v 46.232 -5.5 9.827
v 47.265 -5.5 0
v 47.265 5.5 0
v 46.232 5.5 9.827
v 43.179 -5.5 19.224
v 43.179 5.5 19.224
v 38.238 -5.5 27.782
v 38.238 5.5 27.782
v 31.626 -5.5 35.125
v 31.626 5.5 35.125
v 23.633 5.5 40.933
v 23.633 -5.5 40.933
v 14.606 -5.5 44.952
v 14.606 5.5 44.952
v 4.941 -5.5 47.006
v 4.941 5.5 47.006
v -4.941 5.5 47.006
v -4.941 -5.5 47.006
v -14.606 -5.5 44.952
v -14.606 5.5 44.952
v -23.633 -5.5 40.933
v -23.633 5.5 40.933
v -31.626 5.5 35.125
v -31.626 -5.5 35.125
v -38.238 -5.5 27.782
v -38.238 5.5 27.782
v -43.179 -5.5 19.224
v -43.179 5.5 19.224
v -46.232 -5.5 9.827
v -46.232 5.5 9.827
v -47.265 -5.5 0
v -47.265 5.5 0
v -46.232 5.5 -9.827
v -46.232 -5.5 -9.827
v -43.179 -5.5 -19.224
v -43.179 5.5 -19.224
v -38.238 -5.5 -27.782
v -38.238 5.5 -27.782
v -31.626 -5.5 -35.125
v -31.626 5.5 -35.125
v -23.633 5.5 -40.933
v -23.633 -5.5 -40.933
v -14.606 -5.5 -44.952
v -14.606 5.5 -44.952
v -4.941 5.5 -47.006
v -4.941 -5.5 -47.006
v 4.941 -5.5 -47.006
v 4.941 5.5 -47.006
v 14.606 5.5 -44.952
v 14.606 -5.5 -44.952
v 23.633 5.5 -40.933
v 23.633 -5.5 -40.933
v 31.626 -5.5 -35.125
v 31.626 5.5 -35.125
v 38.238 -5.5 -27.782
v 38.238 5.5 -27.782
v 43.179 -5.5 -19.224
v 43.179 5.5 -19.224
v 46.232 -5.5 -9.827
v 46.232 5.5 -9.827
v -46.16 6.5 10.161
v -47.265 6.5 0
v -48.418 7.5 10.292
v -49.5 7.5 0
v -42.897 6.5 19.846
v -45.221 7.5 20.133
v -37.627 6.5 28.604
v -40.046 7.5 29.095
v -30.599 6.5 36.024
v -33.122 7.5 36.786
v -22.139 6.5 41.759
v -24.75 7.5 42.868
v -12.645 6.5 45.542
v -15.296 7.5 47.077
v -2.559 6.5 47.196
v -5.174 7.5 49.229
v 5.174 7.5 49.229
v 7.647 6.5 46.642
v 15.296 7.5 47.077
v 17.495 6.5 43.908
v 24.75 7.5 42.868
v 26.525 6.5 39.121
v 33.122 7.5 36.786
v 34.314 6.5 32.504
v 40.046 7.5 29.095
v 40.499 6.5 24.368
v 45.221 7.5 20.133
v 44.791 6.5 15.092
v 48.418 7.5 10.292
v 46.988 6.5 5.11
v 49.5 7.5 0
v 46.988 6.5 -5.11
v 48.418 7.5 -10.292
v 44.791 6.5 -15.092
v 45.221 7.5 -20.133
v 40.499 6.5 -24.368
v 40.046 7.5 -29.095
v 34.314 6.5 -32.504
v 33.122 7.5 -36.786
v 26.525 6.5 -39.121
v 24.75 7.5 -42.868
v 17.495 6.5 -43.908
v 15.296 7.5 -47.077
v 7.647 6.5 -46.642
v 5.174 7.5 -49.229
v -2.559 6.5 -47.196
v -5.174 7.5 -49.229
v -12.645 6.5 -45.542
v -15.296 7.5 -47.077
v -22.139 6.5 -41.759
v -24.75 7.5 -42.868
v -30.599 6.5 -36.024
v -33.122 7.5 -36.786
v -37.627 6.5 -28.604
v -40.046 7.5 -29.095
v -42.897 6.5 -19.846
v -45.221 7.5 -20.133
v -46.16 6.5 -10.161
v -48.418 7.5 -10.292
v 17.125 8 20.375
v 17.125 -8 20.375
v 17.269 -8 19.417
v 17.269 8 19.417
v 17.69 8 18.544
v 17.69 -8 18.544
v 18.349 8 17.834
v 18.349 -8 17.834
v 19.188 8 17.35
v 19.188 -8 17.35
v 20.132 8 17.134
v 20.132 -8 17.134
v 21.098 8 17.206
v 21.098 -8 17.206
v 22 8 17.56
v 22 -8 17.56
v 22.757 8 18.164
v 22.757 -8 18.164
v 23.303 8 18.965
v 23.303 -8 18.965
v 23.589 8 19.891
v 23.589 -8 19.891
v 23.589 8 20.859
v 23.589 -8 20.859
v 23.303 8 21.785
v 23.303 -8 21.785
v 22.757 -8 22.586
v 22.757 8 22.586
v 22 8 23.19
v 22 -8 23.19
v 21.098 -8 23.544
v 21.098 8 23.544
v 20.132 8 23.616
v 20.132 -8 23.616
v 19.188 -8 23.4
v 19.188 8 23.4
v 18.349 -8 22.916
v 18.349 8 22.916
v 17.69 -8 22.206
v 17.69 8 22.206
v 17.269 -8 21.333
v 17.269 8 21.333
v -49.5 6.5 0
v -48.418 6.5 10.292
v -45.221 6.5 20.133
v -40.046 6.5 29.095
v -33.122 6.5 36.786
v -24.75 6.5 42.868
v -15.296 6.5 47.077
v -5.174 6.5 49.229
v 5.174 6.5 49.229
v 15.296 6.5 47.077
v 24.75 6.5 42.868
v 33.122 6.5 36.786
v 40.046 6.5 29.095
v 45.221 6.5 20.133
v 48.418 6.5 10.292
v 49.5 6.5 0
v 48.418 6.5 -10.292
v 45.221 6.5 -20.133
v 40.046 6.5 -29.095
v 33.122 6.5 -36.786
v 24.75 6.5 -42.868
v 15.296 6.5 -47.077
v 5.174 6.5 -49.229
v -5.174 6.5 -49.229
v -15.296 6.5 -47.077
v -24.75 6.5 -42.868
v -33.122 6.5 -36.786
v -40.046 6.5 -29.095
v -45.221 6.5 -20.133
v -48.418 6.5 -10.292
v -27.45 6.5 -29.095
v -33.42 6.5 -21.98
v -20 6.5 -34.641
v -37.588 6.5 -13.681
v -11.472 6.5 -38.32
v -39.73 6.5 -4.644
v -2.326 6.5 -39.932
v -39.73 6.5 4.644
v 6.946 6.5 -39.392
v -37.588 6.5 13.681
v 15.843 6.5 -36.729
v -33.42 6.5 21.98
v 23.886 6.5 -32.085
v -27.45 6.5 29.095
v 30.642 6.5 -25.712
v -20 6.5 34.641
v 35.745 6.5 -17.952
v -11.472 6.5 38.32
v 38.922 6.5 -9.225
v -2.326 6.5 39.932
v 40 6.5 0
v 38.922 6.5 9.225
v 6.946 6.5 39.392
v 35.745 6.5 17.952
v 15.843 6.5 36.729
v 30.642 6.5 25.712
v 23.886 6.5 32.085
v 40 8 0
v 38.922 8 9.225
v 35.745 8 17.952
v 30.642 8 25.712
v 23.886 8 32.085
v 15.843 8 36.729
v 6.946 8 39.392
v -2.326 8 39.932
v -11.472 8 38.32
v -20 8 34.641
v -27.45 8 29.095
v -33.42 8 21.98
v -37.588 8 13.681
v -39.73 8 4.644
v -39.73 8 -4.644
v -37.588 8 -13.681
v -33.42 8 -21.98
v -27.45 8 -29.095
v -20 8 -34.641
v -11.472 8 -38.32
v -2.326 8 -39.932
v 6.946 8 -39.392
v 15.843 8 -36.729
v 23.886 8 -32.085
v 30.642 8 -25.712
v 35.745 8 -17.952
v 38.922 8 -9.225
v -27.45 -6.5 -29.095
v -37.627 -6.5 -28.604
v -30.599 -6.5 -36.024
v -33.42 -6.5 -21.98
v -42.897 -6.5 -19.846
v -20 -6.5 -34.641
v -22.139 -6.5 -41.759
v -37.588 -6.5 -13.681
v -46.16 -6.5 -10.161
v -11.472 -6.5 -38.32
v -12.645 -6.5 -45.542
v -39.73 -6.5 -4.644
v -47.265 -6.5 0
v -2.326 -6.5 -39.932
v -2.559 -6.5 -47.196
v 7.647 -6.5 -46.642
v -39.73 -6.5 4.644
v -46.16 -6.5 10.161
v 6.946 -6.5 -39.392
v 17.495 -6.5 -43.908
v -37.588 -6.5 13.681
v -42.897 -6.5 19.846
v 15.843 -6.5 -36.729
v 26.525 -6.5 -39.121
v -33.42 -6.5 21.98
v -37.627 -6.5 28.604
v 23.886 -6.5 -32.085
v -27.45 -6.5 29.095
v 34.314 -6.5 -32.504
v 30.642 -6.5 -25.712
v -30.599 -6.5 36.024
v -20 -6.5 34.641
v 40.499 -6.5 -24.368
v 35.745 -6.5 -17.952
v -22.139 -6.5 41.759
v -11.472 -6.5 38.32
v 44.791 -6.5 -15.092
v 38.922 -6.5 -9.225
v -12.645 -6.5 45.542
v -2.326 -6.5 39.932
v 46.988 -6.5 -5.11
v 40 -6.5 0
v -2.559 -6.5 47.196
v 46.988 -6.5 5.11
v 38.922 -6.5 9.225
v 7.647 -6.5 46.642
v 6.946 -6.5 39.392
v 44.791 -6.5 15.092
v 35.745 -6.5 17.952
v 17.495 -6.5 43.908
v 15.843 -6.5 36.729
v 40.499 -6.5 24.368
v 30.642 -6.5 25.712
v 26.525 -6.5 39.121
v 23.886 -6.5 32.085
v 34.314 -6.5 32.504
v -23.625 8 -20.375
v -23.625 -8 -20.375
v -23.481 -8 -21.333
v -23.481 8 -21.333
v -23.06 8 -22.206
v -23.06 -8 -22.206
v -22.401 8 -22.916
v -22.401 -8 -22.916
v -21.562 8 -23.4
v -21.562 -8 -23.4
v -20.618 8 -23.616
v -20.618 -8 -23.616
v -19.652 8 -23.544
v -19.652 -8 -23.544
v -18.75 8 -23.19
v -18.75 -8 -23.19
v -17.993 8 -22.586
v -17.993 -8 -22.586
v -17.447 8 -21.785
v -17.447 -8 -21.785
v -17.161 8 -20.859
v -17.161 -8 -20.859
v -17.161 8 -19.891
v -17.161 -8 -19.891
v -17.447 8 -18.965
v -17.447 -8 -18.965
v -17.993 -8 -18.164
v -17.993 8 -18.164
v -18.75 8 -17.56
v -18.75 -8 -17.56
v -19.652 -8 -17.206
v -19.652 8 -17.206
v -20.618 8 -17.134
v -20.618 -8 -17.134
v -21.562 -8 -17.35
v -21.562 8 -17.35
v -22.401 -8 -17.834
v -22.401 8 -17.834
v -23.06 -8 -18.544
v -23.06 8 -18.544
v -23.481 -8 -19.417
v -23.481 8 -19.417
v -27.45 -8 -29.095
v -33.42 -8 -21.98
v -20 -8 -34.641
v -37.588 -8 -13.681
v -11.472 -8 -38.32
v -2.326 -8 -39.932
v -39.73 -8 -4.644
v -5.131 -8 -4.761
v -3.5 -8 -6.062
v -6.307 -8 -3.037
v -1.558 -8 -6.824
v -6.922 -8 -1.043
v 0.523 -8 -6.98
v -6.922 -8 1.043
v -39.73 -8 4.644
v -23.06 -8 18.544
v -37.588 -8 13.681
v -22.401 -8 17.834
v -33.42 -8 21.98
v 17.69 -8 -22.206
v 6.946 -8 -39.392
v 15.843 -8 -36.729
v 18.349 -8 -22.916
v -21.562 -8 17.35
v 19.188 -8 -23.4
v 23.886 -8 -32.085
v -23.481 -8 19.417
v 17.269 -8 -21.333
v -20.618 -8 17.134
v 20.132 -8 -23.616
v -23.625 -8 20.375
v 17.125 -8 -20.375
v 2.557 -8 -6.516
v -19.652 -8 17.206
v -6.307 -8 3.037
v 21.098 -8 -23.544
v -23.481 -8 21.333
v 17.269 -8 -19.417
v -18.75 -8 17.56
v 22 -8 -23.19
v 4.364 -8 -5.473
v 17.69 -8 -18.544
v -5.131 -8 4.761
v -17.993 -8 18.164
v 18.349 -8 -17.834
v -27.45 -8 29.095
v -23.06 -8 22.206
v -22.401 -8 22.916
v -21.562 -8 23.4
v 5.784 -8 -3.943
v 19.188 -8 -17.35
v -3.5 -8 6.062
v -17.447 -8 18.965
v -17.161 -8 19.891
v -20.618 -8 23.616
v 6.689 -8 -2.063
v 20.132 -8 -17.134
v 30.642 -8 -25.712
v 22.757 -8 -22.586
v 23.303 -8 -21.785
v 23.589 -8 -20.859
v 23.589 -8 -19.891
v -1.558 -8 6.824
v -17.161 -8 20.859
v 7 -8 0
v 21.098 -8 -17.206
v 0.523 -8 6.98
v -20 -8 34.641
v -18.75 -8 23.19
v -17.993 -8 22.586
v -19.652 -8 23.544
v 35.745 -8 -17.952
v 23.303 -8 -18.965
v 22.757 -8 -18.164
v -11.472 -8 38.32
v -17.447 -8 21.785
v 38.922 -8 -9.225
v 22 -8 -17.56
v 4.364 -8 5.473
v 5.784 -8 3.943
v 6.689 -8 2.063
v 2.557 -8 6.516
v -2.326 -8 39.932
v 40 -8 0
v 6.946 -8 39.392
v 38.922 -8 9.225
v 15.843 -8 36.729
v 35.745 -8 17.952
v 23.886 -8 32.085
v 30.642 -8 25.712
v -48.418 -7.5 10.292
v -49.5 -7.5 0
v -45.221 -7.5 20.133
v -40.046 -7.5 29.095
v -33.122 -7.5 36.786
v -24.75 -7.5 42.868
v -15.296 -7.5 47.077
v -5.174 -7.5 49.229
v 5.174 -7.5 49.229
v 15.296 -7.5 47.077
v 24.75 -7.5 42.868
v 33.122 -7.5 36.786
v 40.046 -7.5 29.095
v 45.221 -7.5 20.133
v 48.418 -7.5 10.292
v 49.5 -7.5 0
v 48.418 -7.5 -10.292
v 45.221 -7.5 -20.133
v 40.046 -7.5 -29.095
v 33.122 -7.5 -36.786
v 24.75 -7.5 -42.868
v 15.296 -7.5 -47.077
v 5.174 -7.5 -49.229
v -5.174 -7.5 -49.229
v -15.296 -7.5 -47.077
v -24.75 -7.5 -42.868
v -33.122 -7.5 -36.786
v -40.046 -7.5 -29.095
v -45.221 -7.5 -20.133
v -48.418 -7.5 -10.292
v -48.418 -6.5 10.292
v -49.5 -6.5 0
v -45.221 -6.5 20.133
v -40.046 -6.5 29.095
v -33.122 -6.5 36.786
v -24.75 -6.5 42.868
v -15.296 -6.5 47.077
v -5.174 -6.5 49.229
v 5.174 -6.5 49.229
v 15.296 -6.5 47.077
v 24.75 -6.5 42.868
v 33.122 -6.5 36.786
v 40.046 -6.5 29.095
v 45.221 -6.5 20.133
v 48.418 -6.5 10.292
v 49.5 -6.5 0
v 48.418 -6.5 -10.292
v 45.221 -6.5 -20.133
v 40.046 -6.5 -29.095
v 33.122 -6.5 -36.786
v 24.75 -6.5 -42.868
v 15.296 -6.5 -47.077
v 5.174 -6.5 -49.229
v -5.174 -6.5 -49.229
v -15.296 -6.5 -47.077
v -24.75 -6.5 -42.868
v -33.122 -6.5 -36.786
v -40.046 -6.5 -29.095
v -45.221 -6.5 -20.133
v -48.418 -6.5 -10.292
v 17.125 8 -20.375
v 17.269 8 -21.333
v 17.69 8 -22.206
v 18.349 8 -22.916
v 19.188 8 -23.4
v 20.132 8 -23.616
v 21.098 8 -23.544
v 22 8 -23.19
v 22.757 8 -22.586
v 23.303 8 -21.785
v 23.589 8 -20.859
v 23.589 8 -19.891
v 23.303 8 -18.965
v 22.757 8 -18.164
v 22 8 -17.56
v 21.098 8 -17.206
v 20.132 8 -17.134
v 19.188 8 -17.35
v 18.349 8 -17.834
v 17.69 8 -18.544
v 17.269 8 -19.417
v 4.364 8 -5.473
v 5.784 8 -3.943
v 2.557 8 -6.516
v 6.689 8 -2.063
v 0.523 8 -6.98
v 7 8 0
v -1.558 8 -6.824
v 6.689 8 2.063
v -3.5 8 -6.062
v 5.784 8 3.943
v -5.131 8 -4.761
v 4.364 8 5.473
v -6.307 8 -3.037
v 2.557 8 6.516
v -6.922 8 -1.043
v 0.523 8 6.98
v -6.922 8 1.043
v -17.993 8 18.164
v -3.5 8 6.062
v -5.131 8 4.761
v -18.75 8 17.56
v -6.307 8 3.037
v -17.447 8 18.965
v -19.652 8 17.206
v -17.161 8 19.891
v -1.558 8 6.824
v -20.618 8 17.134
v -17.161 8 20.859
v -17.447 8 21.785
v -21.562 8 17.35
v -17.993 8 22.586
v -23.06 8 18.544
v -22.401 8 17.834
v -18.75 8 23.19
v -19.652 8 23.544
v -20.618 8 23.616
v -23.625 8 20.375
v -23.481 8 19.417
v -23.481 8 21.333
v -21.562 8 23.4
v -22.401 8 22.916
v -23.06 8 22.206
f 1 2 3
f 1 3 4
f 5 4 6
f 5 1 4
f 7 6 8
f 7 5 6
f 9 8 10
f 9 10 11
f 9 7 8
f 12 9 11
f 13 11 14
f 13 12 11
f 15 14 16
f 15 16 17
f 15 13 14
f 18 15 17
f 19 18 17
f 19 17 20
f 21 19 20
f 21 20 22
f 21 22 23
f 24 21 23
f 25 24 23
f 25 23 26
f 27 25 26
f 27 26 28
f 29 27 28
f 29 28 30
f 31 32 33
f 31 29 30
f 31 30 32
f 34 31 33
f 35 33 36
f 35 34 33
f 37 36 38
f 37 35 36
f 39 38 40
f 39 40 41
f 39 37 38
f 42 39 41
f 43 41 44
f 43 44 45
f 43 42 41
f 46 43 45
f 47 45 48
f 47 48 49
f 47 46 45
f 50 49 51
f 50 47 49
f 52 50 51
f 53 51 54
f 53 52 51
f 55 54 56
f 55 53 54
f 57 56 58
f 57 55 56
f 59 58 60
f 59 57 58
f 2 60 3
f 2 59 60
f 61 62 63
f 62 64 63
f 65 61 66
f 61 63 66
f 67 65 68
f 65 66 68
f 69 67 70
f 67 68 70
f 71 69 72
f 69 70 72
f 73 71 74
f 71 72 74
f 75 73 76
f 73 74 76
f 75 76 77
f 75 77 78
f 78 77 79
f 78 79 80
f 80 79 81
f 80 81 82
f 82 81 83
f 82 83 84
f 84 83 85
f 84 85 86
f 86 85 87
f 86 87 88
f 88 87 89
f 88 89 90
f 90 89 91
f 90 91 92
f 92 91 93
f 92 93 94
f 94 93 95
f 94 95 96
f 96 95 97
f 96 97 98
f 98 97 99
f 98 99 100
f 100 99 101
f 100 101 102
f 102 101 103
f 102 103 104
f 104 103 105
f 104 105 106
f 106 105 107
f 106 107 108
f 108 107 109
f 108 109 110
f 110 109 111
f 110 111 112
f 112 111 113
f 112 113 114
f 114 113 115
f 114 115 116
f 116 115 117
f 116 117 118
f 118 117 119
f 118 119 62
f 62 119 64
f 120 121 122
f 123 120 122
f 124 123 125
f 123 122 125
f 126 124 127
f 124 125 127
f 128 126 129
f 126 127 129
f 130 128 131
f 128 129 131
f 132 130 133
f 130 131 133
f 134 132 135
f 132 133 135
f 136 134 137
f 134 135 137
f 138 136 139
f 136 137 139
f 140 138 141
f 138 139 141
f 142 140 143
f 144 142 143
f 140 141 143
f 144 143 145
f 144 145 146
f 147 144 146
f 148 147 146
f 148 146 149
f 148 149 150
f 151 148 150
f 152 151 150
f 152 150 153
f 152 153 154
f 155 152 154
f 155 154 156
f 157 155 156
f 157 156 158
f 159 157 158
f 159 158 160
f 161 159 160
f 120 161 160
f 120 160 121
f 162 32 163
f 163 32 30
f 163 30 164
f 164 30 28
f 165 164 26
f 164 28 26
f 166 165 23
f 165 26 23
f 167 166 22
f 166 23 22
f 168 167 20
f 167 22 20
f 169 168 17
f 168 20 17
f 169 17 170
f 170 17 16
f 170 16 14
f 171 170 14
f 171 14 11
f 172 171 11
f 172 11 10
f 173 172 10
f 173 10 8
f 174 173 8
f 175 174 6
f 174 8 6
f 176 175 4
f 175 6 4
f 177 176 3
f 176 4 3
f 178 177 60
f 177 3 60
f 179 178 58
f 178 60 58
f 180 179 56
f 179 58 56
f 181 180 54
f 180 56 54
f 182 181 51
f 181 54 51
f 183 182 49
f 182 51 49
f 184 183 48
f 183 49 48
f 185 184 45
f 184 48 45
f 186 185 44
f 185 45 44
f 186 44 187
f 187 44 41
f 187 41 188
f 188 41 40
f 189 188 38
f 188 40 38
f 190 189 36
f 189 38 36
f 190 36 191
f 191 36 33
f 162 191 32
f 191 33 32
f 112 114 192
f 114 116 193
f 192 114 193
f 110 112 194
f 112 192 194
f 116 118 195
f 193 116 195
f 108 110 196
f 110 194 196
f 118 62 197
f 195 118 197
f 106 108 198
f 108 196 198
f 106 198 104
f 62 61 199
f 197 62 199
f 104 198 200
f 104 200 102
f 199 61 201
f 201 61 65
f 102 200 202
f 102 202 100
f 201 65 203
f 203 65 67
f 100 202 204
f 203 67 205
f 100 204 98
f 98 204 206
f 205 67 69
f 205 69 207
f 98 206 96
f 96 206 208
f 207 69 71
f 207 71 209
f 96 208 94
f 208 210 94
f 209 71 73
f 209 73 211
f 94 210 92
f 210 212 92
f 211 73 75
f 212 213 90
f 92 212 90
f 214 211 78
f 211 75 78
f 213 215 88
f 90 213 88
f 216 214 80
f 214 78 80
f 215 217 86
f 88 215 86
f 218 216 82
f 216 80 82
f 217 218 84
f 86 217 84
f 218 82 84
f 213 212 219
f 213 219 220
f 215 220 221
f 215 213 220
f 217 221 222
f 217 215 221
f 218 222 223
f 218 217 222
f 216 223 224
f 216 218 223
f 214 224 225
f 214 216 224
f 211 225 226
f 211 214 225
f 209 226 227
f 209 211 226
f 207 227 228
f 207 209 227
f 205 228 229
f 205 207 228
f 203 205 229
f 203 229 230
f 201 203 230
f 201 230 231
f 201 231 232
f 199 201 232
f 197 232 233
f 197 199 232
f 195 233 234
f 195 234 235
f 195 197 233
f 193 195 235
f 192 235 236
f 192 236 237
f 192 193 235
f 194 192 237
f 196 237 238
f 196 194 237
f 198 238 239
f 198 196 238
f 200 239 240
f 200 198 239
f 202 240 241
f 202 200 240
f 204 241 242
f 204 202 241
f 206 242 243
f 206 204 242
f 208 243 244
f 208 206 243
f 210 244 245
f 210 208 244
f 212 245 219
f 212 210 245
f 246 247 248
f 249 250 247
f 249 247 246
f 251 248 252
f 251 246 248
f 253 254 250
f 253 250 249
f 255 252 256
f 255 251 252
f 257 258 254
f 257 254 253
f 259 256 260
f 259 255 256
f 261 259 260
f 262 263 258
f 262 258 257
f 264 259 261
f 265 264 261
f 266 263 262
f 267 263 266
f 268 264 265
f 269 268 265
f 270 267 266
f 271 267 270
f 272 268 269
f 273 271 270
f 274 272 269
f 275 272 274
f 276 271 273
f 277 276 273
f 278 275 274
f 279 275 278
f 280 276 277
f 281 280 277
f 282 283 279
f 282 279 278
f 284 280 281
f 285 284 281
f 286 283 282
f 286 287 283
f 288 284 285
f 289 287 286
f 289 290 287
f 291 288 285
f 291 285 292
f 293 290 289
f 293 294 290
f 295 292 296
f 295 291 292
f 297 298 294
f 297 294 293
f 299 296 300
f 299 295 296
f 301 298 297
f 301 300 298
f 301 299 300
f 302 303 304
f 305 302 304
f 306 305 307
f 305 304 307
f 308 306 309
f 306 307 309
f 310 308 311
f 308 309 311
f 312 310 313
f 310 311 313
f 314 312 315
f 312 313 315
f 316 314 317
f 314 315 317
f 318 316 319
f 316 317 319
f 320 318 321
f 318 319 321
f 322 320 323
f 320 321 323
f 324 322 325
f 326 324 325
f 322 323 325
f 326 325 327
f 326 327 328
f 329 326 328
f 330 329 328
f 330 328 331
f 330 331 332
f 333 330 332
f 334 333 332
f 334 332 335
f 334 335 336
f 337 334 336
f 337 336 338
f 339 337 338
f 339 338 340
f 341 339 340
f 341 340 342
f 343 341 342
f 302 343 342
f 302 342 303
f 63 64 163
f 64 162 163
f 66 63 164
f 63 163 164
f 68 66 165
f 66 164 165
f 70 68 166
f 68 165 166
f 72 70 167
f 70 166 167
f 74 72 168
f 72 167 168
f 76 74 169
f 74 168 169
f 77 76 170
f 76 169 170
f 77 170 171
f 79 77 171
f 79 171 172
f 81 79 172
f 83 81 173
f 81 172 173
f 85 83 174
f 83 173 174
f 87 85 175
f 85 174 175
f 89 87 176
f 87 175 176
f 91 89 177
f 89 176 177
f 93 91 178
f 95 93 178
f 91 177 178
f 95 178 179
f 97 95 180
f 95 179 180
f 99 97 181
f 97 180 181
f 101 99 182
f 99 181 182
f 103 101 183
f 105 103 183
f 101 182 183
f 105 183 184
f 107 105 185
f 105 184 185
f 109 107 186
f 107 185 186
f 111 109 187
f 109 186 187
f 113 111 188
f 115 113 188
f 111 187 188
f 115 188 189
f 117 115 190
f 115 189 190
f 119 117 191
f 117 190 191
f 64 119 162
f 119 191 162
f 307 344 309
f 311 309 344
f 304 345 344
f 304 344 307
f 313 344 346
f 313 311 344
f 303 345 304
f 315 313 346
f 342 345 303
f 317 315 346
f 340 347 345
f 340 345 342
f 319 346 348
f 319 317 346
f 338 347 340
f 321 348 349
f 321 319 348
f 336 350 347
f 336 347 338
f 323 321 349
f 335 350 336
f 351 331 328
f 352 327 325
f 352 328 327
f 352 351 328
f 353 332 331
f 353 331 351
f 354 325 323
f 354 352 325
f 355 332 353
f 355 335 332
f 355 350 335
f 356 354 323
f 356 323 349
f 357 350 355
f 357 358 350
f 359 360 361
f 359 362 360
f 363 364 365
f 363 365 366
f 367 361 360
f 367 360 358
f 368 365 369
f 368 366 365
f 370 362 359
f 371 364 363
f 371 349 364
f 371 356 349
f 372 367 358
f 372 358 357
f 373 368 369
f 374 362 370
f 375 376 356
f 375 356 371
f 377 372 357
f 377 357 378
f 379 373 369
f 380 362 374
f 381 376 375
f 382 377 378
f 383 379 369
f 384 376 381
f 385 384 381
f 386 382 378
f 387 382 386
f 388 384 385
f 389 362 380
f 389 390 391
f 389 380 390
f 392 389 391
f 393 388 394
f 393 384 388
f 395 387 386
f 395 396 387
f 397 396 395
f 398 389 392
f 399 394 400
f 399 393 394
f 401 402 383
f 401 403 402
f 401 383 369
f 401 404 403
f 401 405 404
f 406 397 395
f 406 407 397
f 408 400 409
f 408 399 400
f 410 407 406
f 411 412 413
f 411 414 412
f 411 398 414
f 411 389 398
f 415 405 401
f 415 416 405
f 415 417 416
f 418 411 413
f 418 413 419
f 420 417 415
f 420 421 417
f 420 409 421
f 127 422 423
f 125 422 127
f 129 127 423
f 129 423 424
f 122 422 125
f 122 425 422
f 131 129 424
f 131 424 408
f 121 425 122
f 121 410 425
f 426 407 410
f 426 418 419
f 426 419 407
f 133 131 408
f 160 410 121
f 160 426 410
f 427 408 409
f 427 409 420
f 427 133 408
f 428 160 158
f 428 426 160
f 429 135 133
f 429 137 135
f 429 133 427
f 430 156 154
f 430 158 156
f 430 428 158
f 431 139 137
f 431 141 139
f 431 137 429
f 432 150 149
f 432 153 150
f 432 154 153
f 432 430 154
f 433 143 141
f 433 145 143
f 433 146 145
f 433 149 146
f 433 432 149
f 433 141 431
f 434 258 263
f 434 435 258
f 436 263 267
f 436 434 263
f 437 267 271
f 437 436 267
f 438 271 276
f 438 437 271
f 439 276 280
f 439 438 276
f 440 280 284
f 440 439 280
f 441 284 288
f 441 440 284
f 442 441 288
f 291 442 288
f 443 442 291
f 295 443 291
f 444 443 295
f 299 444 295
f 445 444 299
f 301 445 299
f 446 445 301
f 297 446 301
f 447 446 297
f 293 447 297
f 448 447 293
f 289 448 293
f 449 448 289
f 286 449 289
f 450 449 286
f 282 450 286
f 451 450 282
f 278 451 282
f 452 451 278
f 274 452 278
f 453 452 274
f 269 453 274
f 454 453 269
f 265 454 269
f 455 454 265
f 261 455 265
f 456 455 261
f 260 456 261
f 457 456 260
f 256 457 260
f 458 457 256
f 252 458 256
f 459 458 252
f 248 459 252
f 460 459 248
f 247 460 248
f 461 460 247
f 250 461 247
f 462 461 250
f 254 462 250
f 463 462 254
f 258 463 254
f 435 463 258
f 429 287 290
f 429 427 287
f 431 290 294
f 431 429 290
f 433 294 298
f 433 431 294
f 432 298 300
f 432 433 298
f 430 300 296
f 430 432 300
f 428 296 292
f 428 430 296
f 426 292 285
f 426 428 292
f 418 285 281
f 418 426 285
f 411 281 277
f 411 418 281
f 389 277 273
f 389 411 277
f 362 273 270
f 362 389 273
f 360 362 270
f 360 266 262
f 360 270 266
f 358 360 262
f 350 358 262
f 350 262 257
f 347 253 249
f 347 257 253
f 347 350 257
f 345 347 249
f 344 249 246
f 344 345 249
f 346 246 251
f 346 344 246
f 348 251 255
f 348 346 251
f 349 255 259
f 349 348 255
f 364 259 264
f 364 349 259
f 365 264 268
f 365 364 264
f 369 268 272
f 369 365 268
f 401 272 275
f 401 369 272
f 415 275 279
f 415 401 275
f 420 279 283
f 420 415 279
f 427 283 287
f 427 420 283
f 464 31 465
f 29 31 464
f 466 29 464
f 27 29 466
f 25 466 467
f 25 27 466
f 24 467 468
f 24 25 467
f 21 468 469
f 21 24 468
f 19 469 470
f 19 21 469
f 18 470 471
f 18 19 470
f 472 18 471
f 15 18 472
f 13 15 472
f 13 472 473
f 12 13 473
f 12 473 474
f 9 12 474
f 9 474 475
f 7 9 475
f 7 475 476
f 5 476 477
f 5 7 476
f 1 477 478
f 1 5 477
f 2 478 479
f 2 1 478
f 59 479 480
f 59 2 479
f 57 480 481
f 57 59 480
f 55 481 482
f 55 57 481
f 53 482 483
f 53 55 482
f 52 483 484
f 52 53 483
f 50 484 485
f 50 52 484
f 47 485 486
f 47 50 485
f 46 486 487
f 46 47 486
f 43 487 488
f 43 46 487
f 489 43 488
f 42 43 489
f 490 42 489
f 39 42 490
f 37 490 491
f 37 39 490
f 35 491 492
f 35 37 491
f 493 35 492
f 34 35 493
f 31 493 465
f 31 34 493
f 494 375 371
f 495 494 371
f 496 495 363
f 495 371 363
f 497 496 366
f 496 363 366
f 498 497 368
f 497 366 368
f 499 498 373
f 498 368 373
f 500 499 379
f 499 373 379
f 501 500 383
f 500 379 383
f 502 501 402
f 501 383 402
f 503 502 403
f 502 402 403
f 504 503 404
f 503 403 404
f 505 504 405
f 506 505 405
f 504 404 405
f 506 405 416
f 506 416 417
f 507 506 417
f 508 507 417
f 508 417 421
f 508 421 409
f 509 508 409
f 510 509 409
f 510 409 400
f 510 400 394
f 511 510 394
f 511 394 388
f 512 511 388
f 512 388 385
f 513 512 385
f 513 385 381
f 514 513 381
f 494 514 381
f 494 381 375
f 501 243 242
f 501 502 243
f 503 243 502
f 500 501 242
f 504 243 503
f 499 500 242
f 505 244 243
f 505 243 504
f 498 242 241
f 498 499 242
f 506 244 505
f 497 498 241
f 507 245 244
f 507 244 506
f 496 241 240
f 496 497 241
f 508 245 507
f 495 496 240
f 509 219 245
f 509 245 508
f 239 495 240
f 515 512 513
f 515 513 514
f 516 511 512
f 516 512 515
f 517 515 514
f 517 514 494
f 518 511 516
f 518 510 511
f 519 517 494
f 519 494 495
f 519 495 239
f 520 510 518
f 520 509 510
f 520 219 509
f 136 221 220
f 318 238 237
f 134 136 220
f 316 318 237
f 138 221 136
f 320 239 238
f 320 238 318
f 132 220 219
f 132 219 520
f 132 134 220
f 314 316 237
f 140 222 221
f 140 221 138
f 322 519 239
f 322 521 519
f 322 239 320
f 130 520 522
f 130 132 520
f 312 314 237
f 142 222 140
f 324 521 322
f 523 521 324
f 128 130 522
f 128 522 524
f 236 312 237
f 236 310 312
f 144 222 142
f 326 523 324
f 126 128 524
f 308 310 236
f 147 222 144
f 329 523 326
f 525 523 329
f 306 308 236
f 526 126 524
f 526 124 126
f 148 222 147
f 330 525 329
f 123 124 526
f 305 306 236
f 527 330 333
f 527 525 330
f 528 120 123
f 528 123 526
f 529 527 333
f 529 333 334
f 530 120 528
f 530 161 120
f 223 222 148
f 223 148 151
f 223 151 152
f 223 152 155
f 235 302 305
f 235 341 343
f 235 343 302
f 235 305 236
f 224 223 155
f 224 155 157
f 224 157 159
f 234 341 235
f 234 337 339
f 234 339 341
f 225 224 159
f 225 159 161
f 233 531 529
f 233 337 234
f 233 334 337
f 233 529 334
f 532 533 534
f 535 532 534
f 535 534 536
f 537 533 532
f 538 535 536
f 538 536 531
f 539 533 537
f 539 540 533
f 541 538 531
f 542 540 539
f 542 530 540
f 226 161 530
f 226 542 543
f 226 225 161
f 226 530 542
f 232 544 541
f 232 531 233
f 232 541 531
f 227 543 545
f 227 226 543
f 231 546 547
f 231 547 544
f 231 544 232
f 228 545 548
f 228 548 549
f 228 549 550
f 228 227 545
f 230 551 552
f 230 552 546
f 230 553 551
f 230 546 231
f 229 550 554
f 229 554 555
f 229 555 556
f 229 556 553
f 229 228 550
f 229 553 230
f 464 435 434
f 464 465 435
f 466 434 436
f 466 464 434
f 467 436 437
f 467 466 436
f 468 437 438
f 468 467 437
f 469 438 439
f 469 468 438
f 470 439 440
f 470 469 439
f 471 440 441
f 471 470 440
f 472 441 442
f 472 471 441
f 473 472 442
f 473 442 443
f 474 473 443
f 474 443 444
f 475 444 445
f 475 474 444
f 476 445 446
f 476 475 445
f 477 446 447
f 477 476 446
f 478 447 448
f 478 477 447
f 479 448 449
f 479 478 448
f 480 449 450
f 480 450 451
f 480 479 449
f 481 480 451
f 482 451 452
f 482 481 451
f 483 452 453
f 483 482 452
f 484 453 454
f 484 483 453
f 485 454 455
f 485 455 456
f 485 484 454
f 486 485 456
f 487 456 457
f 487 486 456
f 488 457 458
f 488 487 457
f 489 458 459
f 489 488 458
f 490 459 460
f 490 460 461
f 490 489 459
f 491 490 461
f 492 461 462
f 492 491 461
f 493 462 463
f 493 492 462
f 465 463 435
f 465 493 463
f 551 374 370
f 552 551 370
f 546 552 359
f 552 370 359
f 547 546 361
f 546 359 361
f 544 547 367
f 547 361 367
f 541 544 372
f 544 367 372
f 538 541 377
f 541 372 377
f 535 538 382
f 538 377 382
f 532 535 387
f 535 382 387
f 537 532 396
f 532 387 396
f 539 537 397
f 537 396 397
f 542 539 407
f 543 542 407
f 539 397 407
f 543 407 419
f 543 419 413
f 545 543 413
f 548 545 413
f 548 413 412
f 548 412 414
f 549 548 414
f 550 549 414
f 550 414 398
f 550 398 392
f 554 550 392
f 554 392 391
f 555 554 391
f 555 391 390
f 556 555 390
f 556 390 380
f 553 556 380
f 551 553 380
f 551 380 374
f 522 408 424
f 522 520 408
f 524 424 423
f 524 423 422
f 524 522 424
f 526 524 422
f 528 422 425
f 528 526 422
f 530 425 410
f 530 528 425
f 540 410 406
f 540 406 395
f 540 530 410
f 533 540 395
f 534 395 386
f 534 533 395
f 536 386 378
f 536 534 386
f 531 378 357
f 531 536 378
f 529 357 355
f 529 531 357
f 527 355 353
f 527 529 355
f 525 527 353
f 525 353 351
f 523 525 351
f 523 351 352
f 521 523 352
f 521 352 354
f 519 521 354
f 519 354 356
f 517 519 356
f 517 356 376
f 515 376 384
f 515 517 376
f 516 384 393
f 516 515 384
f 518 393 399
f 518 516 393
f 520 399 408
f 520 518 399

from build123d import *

# Parameters (mm, degrees)
HOLE_WIZARD_6_5_6_5_1_D = 6.5


with BuildPart() as part:
    # 草圖1 → 旋轉1 (revolve)
    with BuildSketch(Plane.XY):
        Polygon((7, -8), (7, 8), (40, 8), (40, 5.5), (47.265, 5.5), (47.265, -5.5), (40, -5.5), (40, -8), align=None)
    revolve(axis=Axis((0, 49.340027701, 0), (0, -1, 0)))

    # 草圖7 → 旋轉2 (revolve)
    with BuildSketch(Plane.XY):
        Polygon((-49.5, -6.5), (-47.265, -5.5), (-40, -5.5), (-40, -6.5), (-47.265, -6.5), (-49.5, -7.5), align=None)
    revolve_2 = revolve(axis=Axis((0, 0, 0), (0, 1, 0)))

    # 鏡射1: 旋轉2 across plane
    add(revolve_2.mirror(Plane.ZX))

    # Ø6.5 (6.5) 直徑孔1 (through all)
    with Locations(Plane(origin=(0, 8, 0), x_dir=(1, 0, 0), z_dir=(0, 1, 0))):
        with Locations((-20.375, 20.375), (20.375, 20.375), (20.375, -20.375), (-20.375, -20.375), (0, 0)):
            Hole(HOLE_WIZARD_6_5_6_5_1_D / 2)


solid = part.part
